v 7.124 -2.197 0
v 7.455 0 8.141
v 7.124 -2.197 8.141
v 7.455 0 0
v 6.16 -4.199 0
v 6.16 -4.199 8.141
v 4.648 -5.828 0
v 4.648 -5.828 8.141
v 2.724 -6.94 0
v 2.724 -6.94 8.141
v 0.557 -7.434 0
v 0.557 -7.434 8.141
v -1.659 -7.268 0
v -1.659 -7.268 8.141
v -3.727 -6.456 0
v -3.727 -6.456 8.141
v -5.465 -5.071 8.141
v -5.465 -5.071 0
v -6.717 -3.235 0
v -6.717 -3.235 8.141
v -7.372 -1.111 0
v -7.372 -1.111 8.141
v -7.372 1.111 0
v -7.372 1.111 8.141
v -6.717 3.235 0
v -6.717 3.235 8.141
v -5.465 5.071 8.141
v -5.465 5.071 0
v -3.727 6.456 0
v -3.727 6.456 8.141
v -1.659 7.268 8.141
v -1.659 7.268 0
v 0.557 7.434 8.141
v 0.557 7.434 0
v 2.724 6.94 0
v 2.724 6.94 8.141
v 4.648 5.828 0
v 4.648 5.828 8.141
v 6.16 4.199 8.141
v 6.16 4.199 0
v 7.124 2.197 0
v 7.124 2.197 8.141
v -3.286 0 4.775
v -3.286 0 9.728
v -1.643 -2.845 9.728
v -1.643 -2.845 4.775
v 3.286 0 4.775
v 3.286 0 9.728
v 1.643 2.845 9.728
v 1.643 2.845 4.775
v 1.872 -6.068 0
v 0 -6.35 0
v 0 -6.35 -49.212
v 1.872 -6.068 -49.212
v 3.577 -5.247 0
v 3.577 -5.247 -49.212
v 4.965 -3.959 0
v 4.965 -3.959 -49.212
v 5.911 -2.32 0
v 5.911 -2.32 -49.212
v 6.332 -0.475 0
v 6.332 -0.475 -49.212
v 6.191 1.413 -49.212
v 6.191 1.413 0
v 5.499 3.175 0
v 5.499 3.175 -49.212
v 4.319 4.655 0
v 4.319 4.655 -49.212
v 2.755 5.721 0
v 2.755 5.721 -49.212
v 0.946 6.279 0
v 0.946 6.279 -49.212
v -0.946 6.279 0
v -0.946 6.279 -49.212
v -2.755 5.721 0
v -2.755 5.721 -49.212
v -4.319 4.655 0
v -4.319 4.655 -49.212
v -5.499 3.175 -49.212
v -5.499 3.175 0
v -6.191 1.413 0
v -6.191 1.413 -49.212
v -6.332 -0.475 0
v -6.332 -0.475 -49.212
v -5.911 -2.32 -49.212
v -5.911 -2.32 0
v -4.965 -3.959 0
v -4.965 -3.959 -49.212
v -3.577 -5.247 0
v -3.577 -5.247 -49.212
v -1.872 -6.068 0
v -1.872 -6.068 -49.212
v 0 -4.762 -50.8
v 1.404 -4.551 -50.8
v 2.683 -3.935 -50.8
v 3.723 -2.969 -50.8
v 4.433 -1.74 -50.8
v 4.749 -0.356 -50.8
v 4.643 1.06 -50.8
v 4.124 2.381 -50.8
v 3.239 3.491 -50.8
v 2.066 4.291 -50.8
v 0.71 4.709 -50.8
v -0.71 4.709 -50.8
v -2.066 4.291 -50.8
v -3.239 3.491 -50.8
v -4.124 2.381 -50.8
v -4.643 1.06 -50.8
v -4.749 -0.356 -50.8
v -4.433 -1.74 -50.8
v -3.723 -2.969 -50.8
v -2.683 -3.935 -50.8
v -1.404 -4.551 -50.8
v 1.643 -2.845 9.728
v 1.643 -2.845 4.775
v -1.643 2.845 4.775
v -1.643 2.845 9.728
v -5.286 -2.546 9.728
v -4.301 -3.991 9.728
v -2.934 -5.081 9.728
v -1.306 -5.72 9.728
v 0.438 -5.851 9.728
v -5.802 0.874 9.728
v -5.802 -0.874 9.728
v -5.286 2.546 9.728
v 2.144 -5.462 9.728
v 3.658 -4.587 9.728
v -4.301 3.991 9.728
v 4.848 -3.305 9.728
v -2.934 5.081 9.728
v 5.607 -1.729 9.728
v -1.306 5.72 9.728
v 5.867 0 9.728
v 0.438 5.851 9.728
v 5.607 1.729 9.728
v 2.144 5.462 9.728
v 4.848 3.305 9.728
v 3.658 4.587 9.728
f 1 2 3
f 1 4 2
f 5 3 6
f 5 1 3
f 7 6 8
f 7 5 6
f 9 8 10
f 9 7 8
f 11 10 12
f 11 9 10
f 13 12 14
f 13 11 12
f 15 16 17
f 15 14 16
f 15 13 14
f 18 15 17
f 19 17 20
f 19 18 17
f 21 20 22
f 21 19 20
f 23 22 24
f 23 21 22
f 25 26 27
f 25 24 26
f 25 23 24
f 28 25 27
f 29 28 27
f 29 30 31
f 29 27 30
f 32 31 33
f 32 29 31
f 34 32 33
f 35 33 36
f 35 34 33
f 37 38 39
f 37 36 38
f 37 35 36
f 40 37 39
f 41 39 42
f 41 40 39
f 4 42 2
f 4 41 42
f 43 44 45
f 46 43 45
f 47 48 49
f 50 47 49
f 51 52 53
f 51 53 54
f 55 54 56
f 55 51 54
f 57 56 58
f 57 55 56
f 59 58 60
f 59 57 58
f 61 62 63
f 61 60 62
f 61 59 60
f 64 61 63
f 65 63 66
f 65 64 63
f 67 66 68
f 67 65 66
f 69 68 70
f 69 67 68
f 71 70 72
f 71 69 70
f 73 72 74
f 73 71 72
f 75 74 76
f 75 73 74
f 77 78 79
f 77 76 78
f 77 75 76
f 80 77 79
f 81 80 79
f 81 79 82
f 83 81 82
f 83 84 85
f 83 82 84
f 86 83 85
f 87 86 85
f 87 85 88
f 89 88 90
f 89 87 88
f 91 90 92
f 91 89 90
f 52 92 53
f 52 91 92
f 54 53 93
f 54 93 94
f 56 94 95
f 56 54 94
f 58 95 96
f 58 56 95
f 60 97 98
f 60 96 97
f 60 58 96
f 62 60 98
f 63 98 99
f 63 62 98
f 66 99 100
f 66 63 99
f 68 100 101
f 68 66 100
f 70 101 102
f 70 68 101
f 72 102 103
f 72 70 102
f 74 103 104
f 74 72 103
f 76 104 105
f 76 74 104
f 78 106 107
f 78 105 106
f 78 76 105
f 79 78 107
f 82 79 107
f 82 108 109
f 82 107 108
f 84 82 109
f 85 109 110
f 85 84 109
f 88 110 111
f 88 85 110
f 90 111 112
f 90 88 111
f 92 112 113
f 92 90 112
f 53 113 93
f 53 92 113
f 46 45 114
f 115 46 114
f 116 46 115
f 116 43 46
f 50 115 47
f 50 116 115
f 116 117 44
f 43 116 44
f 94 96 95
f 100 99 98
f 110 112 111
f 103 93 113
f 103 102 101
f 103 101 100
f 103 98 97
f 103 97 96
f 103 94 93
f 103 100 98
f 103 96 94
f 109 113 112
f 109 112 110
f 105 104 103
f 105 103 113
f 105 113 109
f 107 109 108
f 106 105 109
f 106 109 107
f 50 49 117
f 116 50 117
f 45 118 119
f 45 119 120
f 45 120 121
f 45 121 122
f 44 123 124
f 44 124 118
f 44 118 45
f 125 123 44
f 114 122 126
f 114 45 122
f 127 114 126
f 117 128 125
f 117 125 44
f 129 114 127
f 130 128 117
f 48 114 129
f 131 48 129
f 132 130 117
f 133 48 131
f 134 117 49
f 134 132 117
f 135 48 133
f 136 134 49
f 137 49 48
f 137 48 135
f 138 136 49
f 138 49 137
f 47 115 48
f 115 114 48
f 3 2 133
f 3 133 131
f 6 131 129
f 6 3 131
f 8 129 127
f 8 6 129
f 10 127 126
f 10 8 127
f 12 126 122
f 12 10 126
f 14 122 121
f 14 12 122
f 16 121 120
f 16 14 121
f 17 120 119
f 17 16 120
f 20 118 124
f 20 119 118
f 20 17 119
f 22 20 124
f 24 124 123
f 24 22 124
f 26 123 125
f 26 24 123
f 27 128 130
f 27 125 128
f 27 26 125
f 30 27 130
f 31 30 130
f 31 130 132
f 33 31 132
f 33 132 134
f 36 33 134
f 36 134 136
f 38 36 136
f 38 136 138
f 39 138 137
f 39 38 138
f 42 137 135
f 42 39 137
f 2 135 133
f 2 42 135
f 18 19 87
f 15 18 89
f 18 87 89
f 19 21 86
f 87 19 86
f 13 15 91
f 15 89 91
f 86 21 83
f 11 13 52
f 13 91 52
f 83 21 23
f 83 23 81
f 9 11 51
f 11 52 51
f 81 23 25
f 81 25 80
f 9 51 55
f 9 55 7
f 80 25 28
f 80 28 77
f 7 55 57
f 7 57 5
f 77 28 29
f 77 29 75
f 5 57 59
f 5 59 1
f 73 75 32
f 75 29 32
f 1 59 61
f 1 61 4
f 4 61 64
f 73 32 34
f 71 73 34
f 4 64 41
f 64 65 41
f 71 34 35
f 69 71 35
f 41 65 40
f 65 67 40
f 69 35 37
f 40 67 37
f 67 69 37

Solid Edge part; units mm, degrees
sketch "Sketch1" plane through (0, 0, 0) normal (0, 0, 1) x (1, 0, 0)
  circle A0 centre (0, 0) radius 7.4549
  dimension "D1" = 14.9098
extrude "Protrusion1" add sketch "Sketch1" along normal blind 9.7282
chamfer "Chamfer_1" distance 1.5875 angle 45 1 edges at (-7.4549, 0, 9.7282)
sketch "Sketch2" plane through (0, 0, 0) normal (0, 0, -1) x (0, -1, 0)
  circle A0 centre (0, 0) radius 6.35
  dimension "D1" = 12.7
extrude "ExtrudedProtrusion_3" add sketch "Sketch2" along normal blind 50.8
chamfer "Chamfer_2" distance 1.5875 angle 45 1 edges at (0, 6.35, -50.8)
sketch "Sketch3" plane through (0, 0, 9.7282) normal (0, 0, 1) x (0, -1, 0)
  line L0 (0, 3.2856) -> (-2.8454, 1.6428)
  line L1 (-2.8454, 1.6428) -> (-2.8454, -1.6428)
  line L2 (-2.8454, -1.6428) -> (0, -3.2856)
  line L3 (0, -3.2856) -> (2.8454, -1.6428)
  line L4 (2.8454, -1.6428) -> (2.8454, 1.6428)
  line L5 (2.8454, 1.6428) -> (0, 3.2856)
extrude "ExtrudedCutout_1" cut sketch "Sketch3" against normal blind 4.953
properties part number "23415" material "Steel"
